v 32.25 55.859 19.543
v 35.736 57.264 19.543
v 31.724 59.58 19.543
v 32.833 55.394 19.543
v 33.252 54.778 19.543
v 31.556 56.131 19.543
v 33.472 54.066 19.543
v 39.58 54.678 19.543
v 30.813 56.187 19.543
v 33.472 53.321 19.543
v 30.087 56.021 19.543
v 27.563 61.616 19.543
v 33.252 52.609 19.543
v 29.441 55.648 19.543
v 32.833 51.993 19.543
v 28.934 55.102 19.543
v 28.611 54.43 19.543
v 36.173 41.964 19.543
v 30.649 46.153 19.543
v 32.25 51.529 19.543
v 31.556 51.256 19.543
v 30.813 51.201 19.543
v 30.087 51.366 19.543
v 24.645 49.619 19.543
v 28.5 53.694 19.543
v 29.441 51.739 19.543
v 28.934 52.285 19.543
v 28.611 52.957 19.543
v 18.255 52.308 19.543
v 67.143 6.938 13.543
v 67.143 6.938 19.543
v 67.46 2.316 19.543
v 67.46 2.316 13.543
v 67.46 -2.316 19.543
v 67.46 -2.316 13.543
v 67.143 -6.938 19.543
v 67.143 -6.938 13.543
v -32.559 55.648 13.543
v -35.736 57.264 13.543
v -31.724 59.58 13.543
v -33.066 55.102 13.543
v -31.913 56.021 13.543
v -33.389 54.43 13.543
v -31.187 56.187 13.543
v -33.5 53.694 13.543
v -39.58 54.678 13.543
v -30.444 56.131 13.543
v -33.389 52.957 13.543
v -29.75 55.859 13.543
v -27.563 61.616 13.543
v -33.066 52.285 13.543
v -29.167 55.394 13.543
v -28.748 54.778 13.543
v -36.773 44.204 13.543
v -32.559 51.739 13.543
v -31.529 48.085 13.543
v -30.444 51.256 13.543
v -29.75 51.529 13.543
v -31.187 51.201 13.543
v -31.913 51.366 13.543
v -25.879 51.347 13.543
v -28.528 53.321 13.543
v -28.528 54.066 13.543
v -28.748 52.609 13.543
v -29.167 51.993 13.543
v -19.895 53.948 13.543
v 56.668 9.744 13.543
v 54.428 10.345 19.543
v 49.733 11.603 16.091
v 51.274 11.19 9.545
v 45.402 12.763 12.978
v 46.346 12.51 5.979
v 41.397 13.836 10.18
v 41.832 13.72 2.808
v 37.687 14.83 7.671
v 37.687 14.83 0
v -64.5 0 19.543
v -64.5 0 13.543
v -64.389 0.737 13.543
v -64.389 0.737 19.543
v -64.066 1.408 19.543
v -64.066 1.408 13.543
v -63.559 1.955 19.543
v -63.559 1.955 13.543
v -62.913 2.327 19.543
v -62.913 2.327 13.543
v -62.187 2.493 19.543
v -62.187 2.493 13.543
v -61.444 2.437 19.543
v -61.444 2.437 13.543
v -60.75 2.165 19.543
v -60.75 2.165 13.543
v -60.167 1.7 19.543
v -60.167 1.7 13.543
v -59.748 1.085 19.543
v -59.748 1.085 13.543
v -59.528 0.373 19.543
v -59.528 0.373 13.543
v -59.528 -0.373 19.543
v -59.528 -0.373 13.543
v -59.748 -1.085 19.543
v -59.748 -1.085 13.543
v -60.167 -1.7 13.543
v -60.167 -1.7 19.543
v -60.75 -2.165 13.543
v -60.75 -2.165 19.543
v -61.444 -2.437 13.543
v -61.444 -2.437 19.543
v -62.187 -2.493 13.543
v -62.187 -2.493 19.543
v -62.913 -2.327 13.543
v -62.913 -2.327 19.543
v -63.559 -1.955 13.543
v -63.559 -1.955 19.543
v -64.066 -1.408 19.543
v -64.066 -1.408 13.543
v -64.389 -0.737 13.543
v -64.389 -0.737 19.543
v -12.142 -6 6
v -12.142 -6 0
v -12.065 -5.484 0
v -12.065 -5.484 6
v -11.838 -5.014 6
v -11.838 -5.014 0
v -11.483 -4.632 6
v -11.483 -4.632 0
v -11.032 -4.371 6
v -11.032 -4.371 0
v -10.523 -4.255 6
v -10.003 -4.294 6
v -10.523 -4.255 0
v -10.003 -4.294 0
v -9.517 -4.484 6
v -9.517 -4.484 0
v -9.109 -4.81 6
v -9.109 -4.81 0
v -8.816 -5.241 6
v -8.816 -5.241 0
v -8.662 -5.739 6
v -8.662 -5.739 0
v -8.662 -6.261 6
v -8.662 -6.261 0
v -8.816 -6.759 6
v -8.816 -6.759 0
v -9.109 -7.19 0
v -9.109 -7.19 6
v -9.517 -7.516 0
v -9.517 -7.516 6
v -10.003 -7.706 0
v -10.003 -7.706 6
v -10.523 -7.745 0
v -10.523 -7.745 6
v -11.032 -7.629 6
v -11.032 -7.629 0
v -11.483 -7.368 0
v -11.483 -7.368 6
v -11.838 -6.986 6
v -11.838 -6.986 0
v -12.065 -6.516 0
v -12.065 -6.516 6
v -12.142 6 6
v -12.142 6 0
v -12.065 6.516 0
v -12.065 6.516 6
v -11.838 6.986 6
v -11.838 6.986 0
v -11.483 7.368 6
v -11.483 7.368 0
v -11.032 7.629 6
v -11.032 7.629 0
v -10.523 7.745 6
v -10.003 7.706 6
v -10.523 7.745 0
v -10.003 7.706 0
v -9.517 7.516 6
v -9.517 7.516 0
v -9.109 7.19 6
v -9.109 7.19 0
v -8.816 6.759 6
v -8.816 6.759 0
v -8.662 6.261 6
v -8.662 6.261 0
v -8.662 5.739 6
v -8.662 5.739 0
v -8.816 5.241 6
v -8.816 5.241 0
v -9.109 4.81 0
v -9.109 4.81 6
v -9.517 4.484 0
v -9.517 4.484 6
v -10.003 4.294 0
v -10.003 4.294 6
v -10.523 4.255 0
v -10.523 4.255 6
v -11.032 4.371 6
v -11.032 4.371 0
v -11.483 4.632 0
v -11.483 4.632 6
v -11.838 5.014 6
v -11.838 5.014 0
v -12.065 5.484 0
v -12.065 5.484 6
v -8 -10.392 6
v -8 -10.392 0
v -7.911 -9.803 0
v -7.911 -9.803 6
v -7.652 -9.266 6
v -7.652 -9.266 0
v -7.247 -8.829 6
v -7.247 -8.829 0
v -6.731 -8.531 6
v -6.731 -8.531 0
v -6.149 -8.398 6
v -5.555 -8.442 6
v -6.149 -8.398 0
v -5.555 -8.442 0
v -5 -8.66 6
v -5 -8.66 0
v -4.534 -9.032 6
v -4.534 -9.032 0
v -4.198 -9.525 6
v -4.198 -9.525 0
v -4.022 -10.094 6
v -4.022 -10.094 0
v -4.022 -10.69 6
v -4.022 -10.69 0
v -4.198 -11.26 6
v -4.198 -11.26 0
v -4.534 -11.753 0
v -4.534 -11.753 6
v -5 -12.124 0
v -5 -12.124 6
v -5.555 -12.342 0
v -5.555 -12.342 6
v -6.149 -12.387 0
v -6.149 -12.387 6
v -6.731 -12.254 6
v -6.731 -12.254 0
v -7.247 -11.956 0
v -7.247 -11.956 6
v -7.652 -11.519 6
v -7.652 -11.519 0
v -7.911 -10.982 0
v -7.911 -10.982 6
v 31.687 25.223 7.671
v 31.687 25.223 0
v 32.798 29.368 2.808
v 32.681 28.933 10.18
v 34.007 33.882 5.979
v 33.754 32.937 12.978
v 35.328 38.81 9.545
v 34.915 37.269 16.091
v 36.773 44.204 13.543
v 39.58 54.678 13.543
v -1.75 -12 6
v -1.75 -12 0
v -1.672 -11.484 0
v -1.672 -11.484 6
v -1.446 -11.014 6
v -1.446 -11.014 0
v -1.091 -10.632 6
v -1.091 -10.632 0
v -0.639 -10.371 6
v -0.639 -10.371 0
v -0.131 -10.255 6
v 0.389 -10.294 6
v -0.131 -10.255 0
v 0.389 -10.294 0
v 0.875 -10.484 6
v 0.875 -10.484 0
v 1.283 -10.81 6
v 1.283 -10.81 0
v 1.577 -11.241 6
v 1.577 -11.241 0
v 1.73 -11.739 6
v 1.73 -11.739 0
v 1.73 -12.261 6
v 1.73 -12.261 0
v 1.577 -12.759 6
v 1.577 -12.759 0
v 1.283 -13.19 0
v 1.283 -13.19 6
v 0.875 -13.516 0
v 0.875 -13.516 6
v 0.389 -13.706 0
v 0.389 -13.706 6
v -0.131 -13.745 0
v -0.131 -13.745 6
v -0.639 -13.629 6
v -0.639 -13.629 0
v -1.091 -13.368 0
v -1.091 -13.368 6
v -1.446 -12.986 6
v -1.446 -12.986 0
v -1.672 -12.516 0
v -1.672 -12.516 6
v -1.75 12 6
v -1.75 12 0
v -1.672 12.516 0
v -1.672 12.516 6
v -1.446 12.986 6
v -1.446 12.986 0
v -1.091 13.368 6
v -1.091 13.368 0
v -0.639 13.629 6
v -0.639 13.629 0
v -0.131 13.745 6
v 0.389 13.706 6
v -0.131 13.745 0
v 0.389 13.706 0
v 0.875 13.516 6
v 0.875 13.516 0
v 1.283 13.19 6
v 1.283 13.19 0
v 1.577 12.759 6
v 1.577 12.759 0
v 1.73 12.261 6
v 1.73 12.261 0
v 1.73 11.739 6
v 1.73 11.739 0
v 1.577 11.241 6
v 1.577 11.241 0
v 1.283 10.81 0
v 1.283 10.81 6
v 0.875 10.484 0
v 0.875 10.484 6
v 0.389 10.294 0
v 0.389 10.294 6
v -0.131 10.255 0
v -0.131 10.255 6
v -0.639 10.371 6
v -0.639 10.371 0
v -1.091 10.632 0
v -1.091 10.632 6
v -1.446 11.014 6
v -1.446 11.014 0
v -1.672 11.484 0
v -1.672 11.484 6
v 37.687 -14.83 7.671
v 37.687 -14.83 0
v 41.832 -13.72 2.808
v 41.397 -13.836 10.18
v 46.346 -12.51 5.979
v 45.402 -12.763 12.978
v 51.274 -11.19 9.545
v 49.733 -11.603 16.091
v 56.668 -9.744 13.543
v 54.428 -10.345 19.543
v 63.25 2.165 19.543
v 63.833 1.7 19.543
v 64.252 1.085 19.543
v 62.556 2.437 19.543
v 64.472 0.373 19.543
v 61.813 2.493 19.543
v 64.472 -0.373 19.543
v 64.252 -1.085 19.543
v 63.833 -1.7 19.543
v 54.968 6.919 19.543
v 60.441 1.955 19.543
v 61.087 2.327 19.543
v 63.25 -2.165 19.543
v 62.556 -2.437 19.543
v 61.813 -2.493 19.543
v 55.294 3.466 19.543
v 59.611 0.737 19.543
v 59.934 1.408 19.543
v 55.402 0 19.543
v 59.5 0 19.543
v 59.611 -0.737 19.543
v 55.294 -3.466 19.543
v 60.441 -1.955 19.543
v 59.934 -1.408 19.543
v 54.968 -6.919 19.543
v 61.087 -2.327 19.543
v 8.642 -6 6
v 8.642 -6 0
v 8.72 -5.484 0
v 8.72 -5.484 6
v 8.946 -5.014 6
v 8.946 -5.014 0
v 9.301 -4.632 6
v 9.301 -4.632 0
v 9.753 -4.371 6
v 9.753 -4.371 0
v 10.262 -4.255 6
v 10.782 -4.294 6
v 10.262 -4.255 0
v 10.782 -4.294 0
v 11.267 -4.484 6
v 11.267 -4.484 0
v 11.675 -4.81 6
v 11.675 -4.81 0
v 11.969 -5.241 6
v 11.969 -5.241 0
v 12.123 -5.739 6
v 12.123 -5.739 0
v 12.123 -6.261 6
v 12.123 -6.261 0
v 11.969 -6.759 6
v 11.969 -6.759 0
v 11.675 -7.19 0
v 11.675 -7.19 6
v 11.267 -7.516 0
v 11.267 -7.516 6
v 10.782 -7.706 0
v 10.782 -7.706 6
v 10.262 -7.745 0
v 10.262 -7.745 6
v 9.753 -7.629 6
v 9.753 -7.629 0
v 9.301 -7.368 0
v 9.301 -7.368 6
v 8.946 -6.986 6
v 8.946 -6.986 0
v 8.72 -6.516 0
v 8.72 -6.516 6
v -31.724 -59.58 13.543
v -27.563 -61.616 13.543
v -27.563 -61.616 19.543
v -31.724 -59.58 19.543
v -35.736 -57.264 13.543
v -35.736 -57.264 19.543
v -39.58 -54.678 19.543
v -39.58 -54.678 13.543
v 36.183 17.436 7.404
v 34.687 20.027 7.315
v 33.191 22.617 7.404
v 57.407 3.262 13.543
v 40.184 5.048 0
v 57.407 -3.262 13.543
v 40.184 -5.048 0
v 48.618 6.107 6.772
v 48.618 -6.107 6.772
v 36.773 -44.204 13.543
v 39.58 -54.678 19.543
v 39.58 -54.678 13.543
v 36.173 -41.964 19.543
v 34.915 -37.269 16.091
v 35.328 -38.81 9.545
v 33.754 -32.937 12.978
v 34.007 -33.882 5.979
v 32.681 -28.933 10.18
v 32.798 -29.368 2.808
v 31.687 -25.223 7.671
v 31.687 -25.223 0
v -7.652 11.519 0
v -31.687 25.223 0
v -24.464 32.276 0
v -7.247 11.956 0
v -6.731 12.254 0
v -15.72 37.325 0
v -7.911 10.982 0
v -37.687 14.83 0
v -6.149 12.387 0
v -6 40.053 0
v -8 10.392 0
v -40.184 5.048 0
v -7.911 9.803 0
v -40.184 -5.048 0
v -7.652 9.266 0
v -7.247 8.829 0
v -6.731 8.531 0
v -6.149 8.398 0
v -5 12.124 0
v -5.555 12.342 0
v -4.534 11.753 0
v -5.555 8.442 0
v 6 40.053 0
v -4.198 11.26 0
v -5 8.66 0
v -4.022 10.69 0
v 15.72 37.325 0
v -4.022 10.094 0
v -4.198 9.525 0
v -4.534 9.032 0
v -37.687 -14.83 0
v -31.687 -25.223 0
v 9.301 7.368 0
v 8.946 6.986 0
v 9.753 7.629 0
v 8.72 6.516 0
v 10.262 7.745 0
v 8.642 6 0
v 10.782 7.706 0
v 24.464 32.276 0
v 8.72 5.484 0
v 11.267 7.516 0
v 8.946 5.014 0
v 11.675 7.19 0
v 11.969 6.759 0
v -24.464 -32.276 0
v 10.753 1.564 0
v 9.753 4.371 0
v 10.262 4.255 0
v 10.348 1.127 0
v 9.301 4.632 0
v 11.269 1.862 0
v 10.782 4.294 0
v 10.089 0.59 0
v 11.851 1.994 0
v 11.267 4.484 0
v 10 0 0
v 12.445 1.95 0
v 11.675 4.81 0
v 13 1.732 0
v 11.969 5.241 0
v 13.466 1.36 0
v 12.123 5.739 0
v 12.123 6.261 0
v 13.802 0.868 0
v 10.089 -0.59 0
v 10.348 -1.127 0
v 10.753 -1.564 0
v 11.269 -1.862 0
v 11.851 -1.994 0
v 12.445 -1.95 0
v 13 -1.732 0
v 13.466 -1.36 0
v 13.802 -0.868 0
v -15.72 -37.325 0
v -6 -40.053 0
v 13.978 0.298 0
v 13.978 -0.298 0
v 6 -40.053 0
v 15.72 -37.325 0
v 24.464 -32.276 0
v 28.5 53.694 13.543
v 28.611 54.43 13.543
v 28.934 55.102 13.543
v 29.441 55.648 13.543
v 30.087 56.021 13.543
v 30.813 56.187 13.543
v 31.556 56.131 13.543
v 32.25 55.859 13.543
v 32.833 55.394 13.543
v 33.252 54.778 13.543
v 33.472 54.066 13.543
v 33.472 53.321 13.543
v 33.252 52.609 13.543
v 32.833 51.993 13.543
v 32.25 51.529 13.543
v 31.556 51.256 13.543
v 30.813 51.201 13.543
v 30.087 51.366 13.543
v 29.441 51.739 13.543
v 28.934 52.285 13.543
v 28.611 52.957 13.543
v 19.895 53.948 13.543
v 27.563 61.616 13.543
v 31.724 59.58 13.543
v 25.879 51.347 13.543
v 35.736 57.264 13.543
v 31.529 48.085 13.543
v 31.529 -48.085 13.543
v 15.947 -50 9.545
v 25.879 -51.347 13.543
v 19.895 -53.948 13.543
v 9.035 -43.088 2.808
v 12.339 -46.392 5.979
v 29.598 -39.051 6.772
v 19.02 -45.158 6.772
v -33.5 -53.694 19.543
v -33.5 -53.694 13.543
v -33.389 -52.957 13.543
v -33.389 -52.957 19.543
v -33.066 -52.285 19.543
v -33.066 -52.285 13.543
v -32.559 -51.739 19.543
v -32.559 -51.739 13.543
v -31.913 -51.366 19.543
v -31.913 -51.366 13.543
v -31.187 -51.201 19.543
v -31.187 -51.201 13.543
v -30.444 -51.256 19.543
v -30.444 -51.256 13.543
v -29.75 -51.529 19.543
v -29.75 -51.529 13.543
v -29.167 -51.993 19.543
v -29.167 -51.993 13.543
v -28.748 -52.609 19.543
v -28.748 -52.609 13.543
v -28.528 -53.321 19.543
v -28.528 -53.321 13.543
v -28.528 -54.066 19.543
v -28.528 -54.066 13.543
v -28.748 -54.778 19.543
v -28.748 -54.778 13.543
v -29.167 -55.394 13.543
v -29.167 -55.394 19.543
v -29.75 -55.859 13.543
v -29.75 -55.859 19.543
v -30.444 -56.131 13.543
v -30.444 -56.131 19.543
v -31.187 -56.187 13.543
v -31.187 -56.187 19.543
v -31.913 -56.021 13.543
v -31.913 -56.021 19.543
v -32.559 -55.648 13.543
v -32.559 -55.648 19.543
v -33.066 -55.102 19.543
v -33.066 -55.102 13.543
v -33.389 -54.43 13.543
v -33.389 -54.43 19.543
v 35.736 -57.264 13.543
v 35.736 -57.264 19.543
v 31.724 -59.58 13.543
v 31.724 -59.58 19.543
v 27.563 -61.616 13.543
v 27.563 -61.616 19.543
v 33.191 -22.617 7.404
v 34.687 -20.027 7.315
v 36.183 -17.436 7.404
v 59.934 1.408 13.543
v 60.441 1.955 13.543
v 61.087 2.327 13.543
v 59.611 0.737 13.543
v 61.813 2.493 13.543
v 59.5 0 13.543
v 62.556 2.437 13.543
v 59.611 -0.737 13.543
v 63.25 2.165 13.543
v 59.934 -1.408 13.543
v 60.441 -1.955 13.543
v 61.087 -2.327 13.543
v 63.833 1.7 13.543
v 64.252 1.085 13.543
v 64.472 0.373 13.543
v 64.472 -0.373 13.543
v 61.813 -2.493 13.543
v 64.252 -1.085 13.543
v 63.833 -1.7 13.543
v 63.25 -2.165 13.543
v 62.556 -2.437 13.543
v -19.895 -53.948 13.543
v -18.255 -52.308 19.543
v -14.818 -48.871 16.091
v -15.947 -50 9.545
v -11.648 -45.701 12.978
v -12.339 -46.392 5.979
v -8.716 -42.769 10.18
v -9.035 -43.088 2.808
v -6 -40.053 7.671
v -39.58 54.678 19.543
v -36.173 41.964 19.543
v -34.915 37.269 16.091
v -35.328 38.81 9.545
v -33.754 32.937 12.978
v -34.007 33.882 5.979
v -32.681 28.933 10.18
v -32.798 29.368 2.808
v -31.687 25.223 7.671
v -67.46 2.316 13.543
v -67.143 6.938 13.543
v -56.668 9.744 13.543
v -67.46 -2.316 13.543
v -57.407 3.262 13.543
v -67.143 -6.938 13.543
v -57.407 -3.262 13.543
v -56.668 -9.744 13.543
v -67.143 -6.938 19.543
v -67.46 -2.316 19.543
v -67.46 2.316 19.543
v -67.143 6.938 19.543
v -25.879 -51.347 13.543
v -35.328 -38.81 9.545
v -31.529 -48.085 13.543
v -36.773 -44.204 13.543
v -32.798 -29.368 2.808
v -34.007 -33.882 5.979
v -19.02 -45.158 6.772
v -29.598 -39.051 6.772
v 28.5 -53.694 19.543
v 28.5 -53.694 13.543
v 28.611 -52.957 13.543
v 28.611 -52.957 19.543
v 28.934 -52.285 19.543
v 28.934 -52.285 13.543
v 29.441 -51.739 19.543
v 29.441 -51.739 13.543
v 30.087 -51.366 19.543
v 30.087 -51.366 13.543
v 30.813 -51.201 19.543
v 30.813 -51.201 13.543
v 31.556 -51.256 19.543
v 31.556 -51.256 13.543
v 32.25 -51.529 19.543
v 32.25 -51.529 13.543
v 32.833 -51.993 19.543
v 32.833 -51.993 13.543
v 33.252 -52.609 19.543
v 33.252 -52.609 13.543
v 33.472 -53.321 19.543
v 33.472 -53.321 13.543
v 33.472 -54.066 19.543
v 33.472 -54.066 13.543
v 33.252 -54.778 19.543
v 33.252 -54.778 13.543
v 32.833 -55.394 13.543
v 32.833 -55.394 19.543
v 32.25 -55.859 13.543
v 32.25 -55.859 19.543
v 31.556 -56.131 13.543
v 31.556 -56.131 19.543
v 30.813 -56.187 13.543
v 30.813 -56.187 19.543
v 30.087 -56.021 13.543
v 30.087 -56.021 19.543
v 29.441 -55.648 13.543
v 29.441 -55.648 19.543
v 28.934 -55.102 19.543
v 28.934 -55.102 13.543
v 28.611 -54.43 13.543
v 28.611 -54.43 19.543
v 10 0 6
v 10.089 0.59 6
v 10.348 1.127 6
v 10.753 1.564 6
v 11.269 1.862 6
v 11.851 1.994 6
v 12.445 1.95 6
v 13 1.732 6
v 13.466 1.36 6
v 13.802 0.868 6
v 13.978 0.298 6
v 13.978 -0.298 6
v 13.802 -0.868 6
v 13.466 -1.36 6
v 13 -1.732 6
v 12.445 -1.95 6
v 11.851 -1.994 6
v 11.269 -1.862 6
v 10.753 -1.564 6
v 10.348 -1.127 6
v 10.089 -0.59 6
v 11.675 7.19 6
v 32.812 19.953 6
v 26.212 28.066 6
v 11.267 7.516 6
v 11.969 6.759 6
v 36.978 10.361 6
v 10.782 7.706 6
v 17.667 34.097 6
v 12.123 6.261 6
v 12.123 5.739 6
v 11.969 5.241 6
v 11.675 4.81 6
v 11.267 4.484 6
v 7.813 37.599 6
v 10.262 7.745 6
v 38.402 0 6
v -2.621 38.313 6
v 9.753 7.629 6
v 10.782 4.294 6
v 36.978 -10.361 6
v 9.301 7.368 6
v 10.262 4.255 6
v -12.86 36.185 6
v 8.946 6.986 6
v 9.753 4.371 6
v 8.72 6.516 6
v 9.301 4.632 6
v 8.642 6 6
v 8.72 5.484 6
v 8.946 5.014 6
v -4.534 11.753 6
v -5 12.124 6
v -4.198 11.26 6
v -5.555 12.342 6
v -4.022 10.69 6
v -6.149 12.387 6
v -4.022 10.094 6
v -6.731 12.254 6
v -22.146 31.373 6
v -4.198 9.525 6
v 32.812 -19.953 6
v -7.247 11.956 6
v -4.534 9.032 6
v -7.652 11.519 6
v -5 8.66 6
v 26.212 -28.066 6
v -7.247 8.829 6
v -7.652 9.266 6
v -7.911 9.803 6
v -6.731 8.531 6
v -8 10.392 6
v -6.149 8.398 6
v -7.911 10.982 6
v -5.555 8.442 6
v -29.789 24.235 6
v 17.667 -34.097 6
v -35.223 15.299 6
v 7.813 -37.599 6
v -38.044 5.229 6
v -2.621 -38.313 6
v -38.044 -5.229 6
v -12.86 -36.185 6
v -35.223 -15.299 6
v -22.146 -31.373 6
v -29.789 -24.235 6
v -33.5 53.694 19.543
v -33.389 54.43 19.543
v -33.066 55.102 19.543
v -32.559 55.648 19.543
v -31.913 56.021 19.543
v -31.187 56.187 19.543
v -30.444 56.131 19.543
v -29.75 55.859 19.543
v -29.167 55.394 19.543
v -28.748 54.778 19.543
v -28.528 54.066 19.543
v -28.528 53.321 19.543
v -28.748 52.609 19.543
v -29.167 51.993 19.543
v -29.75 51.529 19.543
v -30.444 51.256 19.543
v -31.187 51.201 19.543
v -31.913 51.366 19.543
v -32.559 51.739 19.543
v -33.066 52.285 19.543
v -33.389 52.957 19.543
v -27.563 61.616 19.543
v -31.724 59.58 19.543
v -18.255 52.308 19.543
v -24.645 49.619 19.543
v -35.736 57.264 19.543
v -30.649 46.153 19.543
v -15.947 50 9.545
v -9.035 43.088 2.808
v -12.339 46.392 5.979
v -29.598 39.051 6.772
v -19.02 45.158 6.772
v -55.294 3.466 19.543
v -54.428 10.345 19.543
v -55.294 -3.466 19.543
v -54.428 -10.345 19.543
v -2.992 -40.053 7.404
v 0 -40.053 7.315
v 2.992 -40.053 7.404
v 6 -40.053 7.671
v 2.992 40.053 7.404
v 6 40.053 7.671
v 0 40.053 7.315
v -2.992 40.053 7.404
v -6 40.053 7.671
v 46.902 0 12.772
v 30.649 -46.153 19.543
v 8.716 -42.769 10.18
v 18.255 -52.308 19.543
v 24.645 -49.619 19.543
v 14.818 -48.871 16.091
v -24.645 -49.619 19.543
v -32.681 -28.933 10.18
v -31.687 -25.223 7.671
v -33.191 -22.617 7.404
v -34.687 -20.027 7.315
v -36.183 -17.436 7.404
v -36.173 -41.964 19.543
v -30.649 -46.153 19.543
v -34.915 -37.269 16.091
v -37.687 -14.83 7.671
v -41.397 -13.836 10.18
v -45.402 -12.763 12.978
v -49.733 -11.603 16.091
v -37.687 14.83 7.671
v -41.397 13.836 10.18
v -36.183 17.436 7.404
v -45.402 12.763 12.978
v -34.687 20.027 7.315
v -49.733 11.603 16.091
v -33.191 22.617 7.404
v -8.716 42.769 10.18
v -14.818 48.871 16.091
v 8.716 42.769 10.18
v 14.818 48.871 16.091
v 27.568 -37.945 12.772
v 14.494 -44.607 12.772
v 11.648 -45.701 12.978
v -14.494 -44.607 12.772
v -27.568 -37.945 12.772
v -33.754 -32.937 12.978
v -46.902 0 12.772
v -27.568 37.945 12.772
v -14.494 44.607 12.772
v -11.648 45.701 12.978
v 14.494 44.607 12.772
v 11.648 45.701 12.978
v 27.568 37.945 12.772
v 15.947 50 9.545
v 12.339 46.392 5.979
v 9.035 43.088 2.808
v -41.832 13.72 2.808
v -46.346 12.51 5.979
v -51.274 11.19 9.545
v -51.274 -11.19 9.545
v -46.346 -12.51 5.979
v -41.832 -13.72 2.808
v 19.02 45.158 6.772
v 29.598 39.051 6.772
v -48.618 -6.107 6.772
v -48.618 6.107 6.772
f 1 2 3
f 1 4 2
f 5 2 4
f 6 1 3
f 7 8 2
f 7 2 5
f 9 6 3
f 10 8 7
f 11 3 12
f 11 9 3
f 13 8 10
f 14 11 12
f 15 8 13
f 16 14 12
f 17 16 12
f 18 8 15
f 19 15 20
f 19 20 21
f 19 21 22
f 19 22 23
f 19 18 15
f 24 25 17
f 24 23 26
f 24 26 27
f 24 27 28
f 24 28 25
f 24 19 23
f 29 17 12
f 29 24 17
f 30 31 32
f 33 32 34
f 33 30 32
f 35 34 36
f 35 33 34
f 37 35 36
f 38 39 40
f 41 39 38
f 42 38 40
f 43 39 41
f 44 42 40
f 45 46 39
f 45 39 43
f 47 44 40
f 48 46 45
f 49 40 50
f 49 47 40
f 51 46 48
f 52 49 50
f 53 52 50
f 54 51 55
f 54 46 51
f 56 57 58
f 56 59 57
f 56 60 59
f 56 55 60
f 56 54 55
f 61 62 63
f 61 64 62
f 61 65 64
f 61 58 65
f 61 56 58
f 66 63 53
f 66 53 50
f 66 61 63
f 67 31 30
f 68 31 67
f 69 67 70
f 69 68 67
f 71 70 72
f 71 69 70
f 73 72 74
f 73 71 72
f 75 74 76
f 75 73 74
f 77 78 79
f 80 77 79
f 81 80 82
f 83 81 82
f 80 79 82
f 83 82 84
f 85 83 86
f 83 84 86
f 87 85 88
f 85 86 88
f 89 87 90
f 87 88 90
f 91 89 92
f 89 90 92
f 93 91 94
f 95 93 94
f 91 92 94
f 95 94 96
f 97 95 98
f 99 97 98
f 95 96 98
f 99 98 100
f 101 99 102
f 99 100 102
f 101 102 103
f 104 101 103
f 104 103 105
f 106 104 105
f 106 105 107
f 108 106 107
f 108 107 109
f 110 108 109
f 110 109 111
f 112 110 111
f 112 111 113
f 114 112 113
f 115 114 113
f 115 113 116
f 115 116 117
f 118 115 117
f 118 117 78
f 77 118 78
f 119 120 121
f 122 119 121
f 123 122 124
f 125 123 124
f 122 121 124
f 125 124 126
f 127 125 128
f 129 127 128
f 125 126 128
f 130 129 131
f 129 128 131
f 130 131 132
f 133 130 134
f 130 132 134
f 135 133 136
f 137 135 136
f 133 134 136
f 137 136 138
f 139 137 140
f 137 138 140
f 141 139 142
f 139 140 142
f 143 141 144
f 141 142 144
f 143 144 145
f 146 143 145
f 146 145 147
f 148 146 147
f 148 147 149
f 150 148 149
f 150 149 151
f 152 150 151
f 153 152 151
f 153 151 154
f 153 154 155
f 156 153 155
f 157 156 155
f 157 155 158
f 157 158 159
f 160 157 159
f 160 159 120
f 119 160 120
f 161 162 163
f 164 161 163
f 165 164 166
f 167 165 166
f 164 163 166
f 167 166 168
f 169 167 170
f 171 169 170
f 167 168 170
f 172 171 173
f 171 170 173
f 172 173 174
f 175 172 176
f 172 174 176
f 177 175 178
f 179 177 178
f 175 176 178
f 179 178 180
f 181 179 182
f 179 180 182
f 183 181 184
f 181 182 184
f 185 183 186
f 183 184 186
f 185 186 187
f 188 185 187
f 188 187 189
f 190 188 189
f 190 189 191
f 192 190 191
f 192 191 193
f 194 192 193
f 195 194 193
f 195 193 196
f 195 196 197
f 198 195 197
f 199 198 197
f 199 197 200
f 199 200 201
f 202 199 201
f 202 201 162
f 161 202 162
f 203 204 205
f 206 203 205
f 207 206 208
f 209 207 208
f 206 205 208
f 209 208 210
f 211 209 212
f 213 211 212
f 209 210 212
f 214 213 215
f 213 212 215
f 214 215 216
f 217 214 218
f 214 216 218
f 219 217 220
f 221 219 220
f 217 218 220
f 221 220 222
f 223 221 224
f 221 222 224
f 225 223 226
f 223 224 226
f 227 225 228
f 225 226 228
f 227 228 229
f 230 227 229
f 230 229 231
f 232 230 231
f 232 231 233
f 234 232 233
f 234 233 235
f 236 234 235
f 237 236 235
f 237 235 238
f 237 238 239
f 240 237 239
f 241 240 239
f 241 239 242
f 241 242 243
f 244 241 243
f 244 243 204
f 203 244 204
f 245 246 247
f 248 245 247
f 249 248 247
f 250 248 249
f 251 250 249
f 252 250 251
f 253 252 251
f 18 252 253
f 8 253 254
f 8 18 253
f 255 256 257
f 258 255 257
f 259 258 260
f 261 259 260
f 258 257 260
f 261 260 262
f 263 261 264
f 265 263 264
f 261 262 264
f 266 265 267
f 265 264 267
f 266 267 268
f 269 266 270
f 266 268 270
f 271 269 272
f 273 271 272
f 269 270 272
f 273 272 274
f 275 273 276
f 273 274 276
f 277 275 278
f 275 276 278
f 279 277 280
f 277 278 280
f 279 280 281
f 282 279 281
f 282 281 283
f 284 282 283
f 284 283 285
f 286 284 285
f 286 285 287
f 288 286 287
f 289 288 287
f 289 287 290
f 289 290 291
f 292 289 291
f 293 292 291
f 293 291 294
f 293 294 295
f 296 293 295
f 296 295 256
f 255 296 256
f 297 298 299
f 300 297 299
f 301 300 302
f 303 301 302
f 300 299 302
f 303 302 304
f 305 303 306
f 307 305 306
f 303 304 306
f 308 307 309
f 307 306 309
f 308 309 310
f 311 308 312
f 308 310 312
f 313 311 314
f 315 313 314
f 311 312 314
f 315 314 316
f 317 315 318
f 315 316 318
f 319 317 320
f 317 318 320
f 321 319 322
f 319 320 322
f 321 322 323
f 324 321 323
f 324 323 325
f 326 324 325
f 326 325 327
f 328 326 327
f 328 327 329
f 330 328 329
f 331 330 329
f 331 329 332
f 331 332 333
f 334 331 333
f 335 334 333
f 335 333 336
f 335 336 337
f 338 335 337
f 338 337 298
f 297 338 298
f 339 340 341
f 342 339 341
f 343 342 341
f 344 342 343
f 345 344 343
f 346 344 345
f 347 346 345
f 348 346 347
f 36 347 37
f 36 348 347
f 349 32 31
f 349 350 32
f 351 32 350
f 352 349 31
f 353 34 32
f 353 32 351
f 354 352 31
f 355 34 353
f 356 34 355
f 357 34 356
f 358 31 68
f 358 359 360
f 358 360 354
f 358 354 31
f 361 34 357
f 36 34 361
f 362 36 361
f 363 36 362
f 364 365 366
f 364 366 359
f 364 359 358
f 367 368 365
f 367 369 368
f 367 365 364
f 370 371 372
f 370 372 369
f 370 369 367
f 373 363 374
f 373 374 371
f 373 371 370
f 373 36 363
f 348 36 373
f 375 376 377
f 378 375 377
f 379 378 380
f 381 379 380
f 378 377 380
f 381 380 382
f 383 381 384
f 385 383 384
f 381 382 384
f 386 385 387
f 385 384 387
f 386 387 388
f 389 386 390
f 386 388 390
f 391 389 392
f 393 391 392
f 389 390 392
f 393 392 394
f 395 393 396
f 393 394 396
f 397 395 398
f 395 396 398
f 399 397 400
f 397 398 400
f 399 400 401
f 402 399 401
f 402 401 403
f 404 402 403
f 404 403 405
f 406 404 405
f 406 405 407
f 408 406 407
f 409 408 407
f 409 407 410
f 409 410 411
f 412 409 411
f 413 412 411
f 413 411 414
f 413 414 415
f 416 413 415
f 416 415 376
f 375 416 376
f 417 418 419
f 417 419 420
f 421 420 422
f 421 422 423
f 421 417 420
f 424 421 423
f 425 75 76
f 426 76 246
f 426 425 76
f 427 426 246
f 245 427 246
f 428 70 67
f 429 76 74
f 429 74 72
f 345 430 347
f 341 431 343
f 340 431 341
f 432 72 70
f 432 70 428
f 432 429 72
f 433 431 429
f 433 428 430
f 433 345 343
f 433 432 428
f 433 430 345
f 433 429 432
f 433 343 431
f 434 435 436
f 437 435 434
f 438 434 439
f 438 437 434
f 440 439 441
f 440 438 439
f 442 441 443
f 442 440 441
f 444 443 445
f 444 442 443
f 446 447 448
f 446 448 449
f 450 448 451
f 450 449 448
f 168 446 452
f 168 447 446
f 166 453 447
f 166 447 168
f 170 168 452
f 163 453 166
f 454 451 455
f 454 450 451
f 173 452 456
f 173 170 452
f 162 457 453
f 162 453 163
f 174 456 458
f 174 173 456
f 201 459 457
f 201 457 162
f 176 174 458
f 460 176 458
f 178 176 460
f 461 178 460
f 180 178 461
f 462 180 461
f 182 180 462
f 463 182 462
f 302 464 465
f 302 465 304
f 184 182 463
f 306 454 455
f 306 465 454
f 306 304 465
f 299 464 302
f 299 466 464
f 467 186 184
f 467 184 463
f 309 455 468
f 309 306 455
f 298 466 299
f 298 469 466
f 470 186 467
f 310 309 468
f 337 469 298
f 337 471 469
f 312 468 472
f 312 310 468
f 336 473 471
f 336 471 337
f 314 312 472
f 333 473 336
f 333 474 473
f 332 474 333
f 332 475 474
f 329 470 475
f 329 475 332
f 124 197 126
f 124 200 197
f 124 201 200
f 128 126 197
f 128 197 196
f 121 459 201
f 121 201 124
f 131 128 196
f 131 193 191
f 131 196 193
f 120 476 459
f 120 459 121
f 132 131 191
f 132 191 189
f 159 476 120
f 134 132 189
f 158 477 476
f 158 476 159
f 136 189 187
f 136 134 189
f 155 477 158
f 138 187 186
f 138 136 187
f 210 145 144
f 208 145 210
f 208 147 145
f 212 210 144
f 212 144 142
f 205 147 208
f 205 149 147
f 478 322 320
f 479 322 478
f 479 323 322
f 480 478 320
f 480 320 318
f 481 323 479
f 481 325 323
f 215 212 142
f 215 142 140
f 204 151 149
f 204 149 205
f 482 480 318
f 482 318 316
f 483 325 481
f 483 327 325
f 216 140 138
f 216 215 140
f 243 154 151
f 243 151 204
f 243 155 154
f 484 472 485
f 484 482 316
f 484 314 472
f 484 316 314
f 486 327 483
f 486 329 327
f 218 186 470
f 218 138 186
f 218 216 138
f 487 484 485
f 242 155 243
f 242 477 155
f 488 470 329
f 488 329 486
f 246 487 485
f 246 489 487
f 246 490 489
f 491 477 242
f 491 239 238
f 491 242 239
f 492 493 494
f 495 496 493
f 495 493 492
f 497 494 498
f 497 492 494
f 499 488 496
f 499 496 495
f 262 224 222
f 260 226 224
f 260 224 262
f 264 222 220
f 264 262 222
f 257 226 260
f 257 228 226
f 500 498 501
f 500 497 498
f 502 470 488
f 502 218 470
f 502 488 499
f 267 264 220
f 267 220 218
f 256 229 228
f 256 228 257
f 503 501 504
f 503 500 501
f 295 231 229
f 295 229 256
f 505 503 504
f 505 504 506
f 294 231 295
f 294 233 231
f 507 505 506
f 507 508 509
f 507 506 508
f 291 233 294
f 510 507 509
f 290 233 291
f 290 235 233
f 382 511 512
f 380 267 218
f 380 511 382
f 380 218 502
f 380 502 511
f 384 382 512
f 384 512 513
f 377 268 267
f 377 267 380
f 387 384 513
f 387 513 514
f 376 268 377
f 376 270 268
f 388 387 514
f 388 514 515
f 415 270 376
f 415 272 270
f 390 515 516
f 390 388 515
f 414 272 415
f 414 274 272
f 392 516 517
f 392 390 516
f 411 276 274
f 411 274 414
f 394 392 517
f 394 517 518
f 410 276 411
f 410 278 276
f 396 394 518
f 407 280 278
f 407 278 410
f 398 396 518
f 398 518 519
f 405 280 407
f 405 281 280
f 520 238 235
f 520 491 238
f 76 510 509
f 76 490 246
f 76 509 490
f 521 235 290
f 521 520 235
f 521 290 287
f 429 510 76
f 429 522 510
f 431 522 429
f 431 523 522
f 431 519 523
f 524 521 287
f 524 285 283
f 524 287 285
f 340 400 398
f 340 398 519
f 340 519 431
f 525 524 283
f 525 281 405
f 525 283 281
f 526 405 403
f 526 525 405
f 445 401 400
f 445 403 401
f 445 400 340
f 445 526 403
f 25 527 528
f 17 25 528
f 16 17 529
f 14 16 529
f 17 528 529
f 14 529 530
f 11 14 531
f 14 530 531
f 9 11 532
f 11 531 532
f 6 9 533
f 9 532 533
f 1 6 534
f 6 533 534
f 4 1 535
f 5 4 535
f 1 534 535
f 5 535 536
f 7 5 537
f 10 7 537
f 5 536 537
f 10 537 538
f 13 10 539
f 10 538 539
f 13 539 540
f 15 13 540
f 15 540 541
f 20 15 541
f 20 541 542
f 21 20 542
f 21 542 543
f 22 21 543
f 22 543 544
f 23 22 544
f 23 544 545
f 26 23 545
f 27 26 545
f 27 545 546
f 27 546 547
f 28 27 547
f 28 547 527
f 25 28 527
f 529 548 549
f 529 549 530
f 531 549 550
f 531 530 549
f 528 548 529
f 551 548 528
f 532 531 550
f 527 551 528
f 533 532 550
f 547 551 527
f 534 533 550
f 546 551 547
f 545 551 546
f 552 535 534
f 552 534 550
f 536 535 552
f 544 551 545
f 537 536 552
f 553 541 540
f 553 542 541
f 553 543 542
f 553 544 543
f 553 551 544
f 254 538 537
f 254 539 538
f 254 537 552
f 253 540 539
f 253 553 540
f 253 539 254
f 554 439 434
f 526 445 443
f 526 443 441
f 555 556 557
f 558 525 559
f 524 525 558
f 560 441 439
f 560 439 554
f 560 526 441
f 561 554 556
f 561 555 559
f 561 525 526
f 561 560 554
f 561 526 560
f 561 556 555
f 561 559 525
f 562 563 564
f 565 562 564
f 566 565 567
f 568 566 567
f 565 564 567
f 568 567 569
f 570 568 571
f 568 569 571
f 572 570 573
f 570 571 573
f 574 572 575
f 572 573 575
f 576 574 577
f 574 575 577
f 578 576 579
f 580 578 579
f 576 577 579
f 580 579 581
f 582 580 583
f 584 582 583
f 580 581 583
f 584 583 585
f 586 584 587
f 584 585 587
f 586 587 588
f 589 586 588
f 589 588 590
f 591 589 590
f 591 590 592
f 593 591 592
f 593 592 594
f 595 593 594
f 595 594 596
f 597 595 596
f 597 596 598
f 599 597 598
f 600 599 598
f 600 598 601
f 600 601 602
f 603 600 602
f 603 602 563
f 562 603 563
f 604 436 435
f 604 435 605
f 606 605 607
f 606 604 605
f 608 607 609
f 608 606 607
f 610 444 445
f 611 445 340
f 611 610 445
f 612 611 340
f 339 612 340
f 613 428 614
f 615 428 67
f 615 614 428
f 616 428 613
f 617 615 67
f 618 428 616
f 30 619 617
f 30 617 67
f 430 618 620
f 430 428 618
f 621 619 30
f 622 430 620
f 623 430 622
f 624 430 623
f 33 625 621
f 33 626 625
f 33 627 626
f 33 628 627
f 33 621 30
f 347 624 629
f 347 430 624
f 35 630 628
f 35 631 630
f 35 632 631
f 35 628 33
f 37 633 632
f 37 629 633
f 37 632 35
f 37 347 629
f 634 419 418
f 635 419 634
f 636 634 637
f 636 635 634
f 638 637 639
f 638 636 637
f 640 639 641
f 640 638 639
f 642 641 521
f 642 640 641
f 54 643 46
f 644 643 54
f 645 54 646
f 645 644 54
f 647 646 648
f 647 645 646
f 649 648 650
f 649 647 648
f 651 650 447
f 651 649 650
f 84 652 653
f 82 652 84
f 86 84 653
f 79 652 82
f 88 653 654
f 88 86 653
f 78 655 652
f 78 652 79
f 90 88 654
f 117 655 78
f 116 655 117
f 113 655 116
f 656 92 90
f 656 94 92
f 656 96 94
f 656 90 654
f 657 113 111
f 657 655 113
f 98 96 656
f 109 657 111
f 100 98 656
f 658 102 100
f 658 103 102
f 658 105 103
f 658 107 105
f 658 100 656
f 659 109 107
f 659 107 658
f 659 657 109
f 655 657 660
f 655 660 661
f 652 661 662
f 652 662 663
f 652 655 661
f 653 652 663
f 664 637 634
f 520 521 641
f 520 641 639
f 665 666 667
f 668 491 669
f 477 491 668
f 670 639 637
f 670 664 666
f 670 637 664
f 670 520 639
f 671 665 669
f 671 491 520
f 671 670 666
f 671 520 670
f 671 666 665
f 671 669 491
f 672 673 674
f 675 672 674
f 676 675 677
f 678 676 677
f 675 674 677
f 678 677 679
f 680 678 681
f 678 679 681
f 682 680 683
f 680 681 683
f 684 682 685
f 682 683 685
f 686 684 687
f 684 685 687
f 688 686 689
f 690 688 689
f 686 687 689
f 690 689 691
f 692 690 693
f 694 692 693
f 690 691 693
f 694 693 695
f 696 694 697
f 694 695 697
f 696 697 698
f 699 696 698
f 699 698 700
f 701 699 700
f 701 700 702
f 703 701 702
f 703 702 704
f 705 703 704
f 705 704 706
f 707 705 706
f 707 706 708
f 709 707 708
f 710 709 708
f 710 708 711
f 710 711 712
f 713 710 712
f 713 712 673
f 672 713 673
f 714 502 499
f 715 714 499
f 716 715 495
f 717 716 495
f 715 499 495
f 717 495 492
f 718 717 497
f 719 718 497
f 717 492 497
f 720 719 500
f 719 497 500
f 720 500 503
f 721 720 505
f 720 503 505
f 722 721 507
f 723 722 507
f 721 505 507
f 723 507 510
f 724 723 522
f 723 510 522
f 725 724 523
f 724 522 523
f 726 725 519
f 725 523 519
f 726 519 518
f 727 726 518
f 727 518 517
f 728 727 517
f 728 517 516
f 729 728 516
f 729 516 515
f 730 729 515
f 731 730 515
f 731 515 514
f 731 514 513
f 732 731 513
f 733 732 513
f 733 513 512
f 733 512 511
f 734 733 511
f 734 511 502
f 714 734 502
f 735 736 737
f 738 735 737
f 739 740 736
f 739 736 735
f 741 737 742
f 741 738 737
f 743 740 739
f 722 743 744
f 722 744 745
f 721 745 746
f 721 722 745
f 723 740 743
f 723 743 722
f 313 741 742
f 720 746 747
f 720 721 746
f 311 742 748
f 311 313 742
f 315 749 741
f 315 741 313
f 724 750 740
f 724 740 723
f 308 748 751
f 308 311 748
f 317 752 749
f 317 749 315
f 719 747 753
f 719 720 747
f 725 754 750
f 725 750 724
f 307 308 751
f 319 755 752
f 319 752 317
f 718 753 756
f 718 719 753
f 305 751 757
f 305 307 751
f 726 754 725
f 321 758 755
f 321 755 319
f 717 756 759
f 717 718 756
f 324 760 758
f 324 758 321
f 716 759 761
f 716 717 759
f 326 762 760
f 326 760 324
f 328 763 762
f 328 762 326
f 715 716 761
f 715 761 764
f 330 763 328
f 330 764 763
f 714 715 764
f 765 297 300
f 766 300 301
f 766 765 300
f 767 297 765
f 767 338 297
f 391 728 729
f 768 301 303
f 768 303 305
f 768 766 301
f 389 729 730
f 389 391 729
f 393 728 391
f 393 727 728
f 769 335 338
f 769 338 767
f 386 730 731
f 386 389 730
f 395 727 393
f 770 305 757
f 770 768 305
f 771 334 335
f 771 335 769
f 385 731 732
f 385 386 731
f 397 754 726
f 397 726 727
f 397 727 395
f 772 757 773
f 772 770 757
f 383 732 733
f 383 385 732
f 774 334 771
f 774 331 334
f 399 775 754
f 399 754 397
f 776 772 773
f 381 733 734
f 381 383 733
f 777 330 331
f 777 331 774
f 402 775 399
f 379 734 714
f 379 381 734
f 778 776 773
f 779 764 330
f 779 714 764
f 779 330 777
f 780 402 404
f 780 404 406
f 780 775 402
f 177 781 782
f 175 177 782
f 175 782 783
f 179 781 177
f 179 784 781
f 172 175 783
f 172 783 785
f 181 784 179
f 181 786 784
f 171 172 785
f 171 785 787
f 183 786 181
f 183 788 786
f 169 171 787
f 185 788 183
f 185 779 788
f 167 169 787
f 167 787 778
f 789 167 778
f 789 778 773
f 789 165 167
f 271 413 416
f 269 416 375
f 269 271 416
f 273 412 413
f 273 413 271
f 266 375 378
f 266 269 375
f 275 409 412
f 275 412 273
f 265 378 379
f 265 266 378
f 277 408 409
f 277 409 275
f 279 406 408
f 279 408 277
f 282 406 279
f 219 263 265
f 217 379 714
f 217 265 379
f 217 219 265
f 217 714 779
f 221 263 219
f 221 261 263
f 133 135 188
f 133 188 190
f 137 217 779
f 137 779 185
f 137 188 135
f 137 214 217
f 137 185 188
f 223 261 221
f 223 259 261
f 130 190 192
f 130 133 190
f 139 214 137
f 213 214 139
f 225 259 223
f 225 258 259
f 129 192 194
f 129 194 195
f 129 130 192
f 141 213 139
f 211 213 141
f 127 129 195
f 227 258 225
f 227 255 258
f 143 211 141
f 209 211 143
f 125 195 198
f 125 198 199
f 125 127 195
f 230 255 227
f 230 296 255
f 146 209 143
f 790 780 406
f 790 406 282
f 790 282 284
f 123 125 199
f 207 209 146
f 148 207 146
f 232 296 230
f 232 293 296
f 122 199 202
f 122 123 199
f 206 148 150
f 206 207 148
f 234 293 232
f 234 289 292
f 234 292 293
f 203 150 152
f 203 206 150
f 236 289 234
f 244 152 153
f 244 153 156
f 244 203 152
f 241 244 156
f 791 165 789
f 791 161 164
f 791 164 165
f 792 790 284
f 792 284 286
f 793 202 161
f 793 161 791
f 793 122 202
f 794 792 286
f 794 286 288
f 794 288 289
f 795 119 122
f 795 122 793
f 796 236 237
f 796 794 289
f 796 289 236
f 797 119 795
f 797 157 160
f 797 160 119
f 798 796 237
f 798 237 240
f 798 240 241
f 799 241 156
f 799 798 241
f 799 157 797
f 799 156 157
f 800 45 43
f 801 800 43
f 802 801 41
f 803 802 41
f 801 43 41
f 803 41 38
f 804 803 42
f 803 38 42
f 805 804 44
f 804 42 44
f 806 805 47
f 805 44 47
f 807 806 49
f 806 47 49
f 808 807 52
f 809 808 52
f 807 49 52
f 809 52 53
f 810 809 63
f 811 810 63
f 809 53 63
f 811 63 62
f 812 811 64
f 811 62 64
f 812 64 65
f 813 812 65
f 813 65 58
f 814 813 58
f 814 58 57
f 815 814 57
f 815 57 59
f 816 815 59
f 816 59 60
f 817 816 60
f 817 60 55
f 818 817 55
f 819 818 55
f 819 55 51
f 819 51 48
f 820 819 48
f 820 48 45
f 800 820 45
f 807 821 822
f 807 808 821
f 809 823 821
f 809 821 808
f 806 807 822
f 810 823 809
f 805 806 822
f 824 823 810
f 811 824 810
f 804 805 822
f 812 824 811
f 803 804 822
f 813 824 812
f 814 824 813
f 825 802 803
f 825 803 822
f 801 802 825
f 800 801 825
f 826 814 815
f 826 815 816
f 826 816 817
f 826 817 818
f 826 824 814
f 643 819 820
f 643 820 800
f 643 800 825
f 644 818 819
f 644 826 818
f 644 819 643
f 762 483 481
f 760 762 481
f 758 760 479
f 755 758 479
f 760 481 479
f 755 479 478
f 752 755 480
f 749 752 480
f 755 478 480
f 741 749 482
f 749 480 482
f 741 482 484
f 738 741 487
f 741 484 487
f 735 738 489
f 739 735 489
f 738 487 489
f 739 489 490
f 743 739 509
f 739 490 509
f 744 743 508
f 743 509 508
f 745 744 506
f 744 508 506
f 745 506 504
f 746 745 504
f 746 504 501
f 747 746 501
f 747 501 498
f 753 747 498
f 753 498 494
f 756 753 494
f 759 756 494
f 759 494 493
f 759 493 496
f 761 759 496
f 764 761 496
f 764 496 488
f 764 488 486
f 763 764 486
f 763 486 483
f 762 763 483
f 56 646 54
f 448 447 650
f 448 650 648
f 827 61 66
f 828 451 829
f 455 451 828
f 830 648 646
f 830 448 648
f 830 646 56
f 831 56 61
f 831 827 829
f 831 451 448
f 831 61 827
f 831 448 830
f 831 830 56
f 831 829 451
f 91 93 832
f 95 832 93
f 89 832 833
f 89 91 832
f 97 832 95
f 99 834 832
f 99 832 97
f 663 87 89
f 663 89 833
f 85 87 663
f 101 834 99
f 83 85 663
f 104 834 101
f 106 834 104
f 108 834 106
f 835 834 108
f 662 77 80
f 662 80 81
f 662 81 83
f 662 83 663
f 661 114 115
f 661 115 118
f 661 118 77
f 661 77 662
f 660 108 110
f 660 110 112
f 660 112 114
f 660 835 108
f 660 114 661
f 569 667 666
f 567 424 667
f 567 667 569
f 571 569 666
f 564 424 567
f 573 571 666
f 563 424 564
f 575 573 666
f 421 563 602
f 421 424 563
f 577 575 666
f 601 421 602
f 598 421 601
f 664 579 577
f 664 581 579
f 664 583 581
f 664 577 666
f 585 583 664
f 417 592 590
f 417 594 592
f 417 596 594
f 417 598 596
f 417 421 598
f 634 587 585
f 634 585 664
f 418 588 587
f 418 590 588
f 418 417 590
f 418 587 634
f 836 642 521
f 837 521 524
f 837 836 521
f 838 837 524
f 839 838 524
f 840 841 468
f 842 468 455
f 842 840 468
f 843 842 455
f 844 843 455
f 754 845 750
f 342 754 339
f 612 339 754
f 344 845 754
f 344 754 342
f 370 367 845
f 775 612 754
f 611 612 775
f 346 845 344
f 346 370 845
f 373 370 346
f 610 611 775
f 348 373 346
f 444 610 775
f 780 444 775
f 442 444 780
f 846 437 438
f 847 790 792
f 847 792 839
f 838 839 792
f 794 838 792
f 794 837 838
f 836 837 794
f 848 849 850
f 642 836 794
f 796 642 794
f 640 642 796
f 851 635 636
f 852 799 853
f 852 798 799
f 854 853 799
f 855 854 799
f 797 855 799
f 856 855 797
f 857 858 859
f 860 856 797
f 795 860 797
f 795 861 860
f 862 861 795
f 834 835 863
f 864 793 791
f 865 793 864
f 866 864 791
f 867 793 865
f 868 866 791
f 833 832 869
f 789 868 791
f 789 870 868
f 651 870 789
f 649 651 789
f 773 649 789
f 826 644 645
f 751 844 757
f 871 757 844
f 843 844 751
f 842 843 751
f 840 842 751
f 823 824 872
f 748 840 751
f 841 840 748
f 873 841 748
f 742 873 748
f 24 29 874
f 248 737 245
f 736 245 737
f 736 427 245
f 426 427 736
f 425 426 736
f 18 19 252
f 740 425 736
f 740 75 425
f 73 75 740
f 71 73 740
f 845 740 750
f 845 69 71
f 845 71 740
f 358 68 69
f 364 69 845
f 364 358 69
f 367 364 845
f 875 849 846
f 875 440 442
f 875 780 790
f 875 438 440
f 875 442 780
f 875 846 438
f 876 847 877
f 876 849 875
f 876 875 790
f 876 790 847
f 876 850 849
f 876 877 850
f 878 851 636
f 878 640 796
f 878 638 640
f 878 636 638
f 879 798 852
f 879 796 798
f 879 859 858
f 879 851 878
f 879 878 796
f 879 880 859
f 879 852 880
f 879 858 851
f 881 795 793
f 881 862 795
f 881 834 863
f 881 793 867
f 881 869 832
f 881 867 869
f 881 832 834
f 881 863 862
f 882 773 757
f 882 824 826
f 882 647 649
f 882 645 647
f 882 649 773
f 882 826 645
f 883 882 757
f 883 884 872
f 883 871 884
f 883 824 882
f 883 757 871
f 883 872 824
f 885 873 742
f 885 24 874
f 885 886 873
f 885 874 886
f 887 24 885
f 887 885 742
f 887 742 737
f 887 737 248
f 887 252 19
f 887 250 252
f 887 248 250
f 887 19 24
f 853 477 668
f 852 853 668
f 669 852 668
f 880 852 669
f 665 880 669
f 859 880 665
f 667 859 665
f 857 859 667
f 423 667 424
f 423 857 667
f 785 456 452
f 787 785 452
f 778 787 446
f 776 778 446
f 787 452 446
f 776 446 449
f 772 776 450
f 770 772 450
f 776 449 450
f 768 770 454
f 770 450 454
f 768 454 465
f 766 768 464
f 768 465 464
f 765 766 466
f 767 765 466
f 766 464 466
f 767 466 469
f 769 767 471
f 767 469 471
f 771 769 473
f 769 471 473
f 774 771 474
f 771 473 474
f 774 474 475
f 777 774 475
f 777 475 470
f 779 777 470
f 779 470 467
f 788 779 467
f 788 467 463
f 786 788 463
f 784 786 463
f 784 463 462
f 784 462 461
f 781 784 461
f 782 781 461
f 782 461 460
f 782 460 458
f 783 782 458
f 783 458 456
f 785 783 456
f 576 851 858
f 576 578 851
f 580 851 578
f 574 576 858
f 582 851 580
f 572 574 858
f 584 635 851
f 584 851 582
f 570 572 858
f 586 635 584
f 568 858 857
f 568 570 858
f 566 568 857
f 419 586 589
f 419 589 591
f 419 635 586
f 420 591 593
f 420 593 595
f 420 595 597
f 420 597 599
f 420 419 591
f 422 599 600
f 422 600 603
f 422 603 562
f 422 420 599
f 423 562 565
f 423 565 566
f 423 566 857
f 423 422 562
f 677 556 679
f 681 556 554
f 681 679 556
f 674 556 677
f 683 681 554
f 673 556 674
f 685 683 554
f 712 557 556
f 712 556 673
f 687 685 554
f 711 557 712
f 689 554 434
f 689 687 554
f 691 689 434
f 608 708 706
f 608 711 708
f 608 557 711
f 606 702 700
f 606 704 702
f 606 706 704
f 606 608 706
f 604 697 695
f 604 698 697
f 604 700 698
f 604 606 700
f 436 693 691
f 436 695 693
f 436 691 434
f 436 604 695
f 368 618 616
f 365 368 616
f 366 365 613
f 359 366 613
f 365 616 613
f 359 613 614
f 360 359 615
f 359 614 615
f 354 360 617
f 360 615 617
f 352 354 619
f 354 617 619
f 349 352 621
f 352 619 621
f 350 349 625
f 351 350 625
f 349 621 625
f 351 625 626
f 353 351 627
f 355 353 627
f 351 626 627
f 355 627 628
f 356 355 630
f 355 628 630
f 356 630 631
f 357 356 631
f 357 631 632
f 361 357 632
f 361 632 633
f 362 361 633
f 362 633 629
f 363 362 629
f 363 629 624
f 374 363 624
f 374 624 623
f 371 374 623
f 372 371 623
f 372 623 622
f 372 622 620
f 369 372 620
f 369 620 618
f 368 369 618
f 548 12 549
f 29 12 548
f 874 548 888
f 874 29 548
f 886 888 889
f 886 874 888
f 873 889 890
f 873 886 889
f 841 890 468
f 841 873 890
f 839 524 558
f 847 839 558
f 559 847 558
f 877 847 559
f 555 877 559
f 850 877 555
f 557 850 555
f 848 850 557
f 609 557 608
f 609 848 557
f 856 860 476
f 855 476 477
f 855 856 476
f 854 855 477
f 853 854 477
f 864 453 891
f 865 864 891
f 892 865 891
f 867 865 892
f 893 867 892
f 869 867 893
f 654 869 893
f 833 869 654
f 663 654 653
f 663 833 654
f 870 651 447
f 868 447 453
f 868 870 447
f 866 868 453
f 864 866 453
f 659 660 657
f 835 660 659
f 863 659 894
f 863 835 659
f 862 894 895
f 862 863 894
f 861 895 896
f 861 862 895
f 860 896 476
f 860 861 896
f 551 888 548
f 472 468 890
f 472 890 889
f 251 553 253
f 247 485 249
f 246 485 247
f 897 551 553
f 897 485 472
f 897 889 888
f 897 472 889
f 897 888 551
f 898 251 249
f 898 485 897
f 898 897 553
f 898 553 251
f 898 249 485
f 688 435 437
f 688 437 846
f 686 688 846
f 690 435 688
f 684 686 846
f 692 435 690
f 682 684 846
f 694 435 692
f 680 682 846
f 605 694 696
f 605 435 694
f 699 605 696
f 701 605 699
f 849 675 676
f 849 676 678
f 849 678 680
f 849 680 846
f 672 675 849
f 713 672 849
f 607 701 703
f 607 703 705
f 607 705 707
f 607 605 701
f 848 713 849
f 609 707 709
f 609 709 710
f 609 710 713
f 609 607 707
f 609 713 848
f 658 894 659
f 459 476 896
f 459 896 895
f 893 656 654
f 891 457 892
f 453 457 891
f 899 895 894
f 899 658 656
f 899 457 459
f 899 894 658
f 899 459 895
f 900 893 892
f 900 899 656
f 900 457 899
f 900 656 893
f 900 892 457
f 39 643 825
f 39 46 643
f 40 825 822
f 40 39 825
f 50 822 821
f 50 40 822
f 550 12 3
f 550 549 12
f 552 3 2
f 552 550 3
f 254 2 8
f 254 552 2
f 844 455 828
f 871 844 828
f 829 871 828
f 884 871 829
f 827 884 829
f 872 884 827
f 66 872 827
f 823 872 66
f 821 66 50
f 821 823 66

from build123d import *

# Parameters (mm, degrees)
CUT_EXTRUDE15_DEPTH      = 97.415368098
CUT_EXTRUDE15_DEPTH_BACK = 97.415368098
SKETCH53_R               = 2.5
CUT_EXTRUDE16_DEPTH      = 93.391600197
SKETCH88_R               = 1.75
SKETCH88_R_2             = 2
CUT_EXTRUDE17_DEPTH      = 94.459768752


with BuildPart() as part:
    # Sketch51 → Revolve2 (revolve)
    with BuildSketch(Plane(origin=(0, 0, 0), x_dir=(0, 0, -1), z_dir=(1, 0, 0)), mode=Mode.PRIVATE) as revolve2_sk:
        Polygon((-13.54338235, 57.5), (0, 40.5), (0, 0), (-6, 0), (-6, 38.402164253), (-19.54338235, 55.402164253), (-19.54338235, 67.5), (-13.54338235, 67.5), align=None)
    revolve(revolve2_sk.sketch.rotate(Axis((0, 0, 0), (0, 0, -1)), 90), axis=Axis((0, 0, 0), (0, 0, -1)))

    # Sketch52 → Cut-Extrude15 (cut, two sides: drawn at the far end of the back side and taken through both)
    with BuildSketch(Plane(origin=(0, 0, 13.54338235), x_dir=(-1, 0, 0), z_dir=(0, 0, -1)).offset(-CUT_EXTRUDE15_DEPTH_BACK)):
        Polygon((-37.295847234, 71.348937003), (-6, 40.053089768), (6, 40.053089768), (37.295847234, 71.348937003), align=None)
        Polygon((31.68699324, 25.222697307), (37.68699324, 14.830392462), (80.437915594, 3.375317341), (43.14206836, 67.973619662), align=None)
        Polygon((37.68699324, -14.830392462), (31.68699324, -25.222697307), (43.14206836, -67.973619662), (80.437915594, -3.375317341), align=None)
        Polygon((6, -40.053089768), (-6, -40.053089768), (-37.295847234, -71.348937003), (37.295847234, -71.348937003), align=None)
        Polygon((-31.68699324, -25.222697307), (-37.68699324, -14.830392462), (-80.437915594, -3.375317341), (-43.14206836, -67.973619662), align=None)
        Polygon((-37.68699324, 14.830392462), (-31.68699324, 25.222697307), (-43.14206836, 67.973619662), (-80.437915594, 3.375317341), align=None)
    extrude(amount=CUT_EXTRUDE15_DEPTH + CUT_EXTRUDE15_DEPTH_BACK, mode=Mode.SUBTRACT)

    # Sketch53 → Cut-Extrude16 (cut, through all)
    with BuildSketch(Plane(origin=(0, 0, 13.54338235), x_dir=(-1, 0, 0), z_dir=(0, 0, -1))):
        with Locations((62, 0)):
            Circle(SKETCH53_R)
        with Locations((31, -53.693575035)):
            Circle(SKETCH53_R)
        with Locations((-31, -53.693575035)):
            Circle(SKETCH53_R)
        with Locations((-62, 0)):
            Circle(SKETCH53_R)
        with Locations((-31, 53.693575035)):
            Circle(SKETCH53_R)
        with Locations((31, 53.693575035)):
            Circle(SKETCH53_R)
    extrude(amount=-CUT_EXTRUDE16_DEPTH, mode=Mode.SUBTRACT)

    # Sketch88 → Cut-Extrude17 (cut, through all)
    with BuildSketch(Plane(origin=(0, 0, 0), x_dir=(-1, 0, 0), z_dir=(0, 0, -1))):
        with Locations((0, 12)):
            Circle(SKETCH88_R)
        with Locations((10.392304845, 6)):
            Circle(SKETCH88_R)
        with Locations((10.392304845, -6)):
            Circle(SKETCH88_R)
        with Locations((0, -12)):
            Circle(SKETCH88_R)
        with Locations((-10.392304845, -6)):
            Circle(SKETCH88_R)
        with Locations((-10.392304845, 6)):
            Circle(SKETCH88_R)
        with Locations((6, -10.392304845)):
            Circle(SKETCH88_R_2)
        with Locations((-12, 0)):
            Circle(SKETCH88_R_2)
        with Locations((6, 10.392304845)):
            Circle(SKETCH88_R_2)
    extrude(amount=-CUT_EXTRUDE17_DEPTH, mode=Mode.SUBTRACT)


solid = part.part
